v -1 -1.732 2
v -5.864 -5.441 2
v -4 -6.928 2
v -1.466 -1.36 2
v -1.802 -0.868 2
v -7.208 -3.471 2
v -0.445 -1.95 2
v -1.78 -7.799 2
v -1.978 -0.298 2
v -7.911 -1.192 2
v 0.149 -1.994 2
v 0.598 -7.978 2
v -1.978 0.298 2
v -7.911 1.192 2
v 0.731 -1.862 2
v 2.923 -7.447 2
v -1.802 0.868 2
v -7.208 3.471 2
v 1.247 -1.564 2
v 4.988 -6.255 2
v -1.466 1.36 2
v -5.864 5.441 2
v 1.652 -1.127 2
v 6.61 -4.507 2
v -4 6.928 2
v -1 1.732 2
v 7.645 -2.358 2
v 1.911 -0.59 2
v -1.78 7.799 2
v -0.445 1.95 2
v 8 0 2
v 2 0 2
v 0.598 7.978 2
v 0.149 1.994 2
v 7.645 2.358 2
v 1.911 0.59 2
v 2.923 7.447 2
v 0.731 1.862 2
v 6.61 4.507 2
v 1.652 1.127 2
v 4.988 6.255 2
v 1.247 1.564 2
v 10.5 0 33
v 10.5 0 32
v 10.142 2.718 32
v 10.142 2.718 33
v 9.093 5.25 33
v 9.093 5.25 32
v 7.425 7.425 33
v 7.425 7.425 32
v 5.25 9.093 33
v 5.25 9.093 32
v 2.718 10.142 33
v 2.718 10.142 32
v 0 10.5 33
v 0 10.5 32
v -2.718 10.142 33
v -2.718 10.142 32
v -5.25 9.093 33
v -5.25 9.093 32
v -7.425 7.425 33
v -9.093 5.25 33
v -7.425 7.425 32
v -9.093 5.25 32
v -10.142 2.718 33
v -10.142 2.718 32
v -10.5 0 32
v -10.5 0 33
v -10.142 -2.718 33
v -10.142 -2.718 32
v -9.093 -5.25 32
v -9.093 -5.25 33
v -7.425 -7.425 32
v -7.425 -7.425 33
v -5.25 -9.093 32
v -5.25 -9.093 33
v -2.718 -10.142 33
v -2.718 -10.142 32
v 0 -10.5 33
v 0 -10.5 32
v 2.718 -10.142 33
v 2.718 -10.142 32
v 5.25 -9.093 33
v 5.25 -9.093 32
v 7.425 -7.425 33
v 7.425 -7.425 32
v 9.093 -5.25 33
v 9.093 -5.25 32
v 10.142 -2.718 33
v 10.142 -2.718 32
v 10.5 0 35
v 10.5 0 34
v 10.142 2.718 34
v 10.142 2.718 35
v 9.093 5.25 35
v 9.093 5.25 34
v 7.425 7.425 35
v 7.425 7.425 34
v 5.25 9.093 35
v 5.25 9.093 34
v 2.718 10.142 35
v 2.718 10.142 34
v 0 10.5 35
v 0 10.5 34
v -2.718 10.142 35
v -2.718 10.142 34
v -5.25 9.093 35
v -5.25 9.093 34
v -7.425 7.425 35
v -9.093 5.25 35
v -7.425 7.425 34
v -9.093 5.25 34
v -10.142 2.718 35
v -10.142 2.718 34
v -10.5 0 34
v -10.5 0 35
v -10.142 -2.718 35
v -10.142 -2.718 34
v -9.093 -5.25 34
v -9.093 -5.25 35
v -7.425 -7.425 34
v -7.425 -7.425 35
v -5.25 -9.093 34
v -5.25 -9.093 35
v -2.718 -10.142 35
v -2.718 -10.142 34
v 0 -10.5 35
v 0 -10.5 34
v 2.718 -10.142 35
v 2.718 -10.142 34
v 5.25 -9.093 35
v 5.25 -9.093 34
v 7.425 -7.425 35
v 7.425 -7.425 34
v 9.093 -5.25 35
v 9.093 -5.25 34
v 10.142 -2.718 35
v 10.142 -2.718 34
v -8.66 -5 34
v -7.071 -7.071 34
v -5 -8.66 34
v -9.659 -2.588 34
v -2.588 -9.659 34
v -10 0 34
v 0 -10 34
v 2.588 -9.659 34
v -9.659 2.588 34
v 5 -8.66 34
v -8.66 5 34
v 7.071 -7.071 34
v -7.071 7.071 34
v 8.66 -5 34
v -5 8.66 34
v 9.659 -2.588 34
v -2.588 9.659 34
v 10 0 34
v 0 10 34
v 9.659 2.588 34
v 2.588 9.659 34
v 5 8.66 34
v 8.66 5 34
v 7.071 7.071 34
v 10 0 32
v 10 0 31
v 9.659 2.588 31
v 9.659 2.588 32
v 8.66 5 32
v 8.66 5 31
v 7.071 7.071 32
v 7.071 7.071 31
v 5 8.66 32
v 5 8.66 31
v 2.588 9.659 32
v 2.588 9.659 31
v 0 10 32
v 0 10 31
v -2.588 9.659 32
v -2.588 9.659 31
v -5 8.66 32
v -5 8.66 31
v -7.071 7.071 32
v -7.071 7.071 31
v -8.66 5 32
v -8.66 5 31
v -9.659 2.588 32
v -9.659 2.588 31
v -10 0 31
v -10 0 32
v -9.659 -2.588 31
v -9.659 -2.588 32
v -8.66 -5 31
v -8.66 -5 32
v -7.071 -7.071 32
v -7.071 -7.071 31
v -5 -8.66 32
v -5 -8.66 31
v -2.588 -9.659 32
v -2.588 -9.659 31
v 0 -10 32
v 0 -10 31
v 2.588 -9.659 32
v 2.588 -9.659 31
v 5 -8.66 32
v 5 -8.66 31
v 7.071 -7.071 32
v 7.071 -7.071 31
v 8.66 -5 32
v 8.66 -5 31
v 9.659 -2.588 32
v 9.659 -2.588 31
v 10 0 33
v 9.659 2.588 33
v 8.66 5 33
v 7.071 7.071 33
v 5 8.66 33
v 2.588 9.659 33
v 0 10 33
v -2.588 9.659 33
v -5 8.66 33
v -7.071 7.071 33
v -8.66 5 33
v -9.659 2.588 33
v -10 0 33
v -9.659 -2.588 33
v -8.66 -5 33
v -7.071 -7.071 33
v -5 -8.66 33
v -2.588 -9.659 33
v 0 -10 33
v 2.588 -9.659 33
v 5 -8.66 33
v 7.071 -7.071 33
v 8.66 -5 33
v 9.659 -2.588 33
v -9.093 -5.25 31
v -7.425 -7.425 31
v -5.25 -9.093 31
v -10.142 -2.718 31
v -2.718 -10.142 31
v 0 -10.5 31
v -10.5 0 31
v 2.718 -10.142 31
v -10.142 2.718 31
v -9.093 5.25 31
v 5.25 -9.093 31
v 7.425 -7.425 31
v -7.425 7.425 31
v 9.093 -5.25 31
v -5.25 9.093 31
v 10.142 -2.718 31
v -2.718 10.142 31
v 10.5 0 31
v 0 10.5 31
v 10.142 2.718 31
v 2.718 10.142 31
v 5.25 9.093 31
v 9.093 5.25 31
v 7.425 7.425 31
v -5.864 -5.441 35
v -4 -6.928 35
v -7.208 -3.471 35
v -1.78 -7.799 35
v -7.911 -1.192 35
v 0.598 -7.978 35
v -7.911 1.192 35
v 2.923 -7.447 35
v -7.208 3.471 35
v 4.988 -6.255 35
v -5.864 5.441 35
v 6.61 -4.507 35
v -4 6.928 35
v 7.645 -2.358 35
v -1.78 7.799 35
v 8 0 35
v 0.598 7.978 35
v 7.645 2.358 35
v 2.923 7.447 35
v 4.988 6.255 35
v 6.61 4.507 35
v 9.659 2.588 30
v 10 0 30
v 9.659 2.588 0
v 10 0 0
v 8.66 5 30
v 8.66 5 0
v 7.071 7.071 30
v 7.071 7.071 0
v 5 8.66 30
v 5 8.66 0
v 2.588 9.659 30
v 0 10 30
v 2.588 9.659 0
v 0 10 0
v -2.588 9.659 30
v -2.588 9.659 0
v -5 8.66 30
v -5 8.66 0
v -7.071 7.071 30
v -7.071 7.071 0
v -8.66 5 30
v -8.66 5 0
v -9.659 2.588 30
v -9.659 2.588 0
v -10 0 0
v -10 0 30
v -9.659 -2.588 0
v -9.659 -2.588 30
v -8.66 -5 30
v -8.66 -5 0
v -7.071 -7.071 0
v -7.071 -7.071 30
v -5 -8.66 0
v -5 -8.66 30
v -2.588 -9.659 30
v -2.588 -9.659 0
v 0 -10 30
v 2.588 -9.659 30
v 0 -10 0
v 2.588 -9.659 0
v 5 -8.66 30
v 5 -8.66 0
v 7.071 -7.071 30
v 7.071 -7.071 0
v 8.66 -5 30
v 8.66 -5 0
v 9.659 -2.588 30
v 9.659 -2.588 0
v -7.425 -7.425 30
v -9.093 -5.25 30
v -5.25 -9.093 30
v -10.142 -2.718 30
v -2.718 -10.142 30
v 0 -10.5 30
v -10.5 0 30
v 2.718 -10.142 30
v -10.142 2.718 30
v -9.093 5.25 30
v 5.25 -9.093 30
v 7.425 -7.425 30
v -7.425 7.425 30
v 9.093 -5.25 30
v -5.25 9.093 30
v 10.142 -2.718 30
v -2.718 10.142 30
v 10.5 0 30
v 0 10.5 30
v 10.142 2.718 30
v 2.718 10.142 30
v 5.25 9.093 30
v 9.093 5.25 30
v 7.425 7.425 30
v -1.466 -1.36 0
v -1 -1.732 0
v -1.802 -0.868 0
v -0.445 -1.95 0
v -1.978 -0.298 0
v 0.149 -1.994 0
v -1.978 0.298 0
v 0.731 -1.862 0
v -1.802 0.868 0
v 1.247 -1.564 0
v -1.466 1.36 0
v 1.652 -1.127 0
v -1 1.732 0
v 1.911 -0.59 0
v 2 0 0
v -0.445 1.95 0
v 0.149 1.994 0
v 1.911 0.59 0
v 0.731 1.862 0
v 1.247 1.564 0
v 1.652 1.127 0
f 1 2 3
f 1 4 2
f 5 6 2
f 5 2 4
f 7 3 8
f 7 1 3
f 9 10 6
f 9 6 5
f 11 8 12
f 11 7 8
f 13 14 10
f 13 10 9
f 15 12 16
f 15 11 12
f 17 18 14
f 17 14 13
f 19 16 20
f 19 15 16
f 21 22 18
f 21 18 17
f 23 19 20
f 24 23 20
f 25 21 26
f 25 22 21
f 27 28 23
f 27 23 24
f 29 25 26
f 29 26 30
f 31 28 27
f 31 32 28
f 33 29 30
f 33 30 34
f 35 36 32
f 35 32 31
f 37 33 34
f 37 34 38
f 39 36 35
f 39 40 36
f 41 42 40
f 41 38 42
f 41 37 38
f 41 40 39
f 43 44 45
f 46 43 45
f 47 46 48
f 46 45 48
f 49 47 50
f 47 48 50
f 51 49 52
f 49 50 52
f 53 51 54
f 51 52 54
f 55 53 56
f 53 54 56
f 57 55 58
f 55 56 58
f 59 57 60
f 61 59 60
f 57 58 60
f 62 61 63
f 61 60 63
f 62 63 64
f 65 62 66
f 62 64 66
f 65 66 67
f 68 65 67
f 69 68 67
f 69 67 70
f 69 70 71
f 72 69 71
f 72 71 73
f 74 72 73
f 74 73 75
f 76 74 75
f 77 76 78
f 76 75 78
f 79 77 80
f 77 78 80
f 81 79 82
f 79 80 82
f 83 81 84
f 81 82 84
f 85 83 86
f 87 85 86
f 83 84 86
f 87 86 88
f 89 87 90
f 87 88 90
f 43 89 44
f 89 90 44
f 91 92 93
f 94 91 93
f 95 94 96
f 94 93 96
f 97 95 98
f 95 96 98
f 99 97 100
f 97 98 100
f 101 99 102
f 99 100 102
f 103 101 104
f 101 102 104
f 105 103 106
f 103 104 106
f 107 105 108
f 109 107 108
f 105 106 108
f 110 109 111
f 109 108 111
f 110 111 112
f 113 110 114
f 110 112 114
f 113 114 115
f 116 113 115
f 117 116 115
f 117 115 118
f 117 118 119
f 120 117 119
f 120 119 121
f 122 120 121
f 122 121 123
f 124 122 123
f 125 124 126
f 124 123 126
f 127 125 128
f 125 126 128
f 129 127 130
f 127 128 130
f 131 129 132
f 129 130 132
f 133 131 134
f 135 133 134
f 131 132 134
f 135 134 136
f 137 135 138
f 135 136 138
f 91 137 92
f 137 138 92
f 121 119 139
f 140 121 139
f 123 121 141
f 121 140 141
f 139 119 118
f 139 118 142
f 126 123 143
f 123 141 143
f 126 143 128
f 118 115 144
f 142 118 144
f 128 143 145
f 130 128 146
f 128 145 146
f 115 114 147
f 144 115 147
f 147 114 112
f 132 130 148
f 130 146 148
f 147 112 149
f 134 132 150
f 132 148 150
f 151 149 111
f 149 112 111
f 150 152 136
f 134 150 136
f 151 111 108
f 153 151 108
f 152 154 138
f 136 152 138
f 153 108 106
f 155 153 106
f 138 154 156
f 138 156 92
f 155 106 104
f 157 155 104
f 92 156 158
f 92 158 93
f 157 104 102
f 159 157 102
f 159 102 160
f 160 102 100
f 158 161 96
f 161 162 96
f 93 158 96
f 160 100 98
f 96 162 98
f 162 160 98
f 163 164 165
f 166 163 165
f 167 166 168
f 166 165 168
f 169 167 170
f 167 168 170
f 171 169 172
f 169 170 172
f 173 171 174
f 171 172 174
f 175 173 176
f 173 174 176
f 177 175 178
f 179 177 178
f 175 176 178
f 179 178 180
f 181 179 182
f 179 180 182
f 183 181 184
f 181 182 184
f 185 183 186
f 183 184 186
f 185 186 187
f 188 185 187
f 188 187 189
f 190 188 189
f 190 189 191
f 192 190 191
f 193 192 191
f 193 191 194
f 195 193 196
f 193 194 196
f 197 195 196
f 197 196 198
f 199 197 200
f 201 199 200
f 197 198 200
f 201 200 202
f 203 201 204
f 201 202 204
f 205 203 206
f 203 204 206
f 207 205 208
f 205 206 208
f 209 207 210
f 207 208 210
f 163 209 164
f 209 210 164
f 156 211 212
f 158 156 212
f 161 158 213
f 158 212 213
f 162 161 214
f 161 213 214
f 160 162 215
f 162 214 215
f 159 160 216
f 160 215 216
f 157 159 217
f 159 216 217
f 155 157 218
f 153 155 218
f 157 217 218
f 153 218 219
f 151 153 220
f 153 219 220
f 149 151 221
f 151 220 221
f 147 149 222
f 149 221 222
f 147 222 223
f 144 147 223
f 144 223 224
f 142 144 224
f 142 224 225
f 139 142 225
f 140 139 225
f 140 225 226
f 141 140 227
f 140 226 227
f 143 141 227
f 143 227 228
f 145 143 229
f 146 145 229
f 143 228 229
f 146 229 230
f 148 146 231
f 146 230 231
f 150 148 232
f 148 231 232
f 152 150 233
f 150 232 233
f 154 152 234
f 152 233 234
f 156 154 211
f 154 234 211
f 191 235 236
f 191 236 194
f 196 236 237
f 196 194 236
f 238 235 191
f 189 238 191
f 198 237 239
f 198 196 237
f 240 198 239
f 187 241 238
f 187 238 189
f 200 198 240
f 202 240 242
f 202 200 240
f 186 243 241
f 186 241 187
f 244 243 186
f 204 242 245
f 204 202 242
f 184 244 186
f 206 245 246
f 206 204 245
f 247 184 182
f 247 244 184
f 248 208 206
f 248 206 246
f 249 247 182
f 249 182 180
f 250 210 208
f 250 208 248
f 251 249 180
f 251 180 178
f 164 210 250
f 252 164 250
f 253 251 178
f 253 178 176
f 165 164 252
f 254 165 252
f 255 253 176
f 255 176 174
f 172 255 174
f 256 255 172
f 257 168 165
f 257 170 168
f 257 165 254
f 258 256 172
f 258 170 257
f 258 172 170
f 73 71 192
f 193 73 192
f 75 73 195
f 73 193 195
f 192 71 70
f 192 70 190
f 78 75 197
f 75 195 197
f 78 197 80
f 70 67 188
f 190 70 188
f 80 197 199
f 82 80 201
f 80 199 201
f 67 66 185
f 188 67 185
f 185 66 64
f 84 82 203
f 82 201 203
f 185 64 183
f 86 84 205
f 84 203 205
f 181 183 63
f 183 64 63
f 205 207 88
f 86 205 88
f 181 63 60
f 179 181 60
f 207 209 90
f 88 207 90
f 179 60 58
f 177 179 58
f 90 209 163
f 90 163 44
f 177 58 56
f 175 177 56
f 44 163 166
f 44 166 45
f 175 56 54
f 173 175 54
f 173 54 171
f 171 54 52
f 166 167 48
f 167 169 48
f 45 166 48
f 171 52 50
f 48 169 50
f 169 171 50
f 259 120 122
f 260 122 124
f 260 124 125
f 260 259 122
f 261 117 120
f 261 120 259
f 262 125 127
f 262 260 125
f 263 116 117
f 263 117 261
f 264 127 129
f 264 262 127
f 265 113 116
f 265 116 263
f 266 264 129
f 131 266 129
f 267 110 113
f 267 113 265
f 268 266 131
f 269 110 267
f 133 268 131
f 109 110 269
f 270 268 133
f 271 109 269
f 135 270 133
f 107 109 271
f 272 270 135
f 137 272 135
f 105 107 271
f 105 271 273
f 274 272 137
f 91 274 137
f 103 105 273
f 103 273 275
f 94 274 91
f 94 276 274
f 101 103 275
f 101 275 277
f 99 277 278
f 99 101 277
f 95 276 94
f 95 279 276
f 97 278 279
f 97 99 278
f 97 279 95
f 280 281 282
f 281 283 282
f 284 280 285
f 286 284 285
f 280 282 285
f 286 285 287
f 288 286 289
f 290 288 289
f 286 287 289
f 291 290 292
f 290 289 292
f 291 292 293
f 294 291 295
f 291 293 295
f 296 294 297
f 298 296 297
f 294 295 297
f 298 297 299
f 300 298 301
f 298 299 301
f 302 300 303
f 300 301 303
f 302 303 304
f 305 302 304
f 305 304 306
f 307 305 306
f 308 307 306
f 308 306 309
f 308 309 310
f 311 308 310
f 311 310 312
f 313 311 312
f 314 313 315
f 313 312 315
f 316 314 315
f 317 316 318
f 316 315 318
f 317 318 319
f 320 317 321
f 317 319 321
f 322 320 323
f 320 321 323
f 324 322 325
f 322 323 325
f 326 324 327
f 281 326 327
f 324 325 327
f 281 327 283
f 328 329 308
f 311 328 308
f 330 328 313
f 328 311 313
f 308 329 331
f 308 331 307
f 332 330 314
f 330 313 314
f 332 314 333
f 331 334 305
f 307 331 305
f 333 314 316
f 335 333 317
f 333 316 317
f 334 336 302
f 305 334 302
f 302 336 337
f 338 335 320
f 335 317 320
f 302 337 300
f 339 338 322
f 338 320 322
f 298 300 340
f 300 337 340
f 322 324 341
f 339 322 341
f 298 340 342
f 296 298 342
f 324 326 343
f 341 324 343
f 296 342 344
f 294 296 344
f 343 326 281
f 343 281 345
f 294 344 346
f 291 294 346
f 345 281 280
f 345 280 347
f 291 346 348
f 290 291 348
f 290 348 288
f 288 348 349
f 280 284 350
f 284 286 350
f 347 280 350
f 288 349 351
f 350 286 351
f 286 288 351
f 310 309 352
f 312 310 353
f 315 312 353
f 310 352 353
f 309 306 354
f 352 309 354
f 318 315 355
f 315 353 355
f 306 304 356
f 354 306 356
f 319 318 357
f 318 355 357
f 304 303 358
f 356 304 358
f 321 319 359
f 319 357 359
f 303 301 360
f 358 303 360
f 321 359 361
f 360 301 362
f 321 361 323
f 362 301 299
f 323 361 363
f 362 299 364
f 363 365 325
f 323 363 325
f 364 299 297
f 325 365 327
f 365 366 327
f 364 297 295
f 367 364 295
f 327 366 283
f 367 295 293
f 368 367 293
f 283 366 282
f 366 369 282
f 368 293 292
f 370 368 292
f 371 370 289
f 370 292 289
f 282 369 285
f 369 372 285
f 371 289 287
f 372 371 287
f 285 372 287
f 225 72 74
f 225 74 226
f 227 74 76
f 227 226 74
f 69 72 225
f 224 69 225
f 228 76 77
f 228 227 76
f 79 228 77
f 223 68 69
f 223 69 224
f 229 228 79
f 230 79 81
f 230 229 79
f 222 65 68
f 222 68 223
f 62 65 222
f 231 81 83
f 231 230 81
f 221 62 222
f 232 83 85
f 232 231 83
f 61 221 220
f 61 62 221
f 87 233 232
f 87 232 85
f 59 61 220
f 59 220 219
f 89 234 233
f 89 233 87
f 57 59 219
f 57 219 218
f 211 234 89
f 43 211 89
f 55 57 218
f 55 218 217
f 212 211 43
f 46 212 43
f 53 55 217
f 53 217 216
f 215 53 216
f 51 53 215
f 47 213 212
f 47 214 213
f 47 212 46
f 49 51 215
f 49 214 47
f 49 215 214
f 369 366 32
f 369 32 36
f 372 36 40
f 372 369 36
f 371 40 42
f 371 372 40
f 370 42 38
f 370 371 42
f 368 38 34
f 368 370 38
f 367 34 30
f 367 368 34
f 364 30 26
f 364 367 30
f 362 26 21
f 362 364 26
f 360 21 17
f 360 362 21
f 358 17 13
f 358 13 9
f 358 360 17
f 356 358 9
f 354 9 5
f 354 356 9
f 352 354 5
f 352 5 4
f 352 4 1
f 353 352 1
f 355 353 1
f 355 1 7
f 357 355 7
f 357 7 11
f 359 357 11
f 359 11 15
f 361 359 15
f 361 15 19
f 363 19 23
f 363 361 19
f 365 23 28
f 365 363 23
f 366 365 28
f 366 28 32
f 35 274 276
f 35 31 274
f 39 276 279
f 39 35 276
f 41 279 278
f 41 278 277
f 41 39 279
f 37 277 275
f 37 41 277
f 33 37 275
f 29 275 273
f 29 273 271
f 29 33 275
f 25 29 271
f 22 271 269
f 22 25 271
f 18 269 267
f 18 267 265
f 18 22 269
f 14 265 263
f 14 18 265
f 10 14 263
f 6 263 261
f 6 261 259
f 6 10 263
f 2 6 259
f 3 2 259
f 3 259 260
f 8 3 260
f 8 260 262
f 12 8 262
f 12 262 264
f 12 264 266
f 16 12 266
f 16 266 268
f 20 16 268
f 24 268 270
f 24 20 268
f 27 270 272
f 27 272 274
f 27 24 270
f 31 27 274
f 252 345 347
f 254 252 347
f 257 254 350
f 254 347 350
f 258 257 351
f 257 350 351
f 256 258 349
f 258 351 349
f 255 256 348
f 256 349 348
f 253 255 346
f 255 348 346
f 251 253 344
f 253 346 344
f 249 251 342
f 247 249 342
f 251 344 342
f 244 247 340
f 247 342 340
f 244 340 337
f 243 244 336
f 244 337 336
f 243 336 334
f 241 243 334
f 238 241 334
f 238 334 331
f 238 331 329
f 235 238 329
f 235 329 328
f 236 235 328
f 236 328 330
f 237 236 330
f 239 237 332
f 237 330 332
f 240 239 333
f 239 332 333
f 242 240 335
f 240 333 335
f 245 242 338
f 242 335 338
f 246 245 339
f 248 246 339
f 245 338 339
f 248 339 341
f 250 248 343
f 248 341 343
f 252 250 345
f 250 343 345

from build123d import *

# Parameters (mm, degrees)
F0_R      = 10
F0_R_2    = 2
F1_DEPTH  = 2
F2_R      = 10
F2_R_2    = 8
F3_DEPTH  = 28
F4_R      = 10.5
F4_R_2    = 8
F5_DEPTH  = 1
F6_R      = 10
F6_R_2    = 8
F7_DEPTH  = 1
F8_R      = 10.5
F8_R_2    = 8
F9_DEPTH  = 1
F10_R     = 10
F10_R_2   = 8
F11_DEPTH = 1
F12_R     = 10.5
F12_R_2   = 8
F13_DEPTH = 1


with BuildPart() as f1:
    # F0 (on Top) → F1 (new body)
    with BuildSketch(Plane.XY):
        Circle(F0_R)
        Circle(F0_R_2, mode=Mode.SUBTRACT)
    extrude(amount=F1_DEPTH)

    # F2 (on face) → F3 (join)
    with BuildSketch(Plane.XY.offset(2)):
        Circle(F2_R)
        Circle(F2_R_2, mode=Mode.SUBTRACT)
    extrude(amount=F3_DEPTH)

    # F4 (on face) → F5 (join)
    with BuildSketch(Plane.XY.offset(30)):
        Circle(F4_R)
        Circle(F4_R_2, mode=Mode.SUBTRACT)
    extrude(amount=F5_DEPTH)

    # F6 (on face) → F7 (join)
    with BuildSketch(Plane.XY.offset(31)):
        Circle(F6_R)
        Circle(F6_R_2, mode=Mode.SUBTRACT)
    extrude(amount=F7_DEPTH)

    # F8 (on face) → F9 (join)
    with BuildSketch(Plane.XY.offset(32)):
        Circle(F8_R)
        Circle(F8_R_2, mode=Mode.SUBTRACT)
    extrude(amount=F9_DEPTH)

    # F10 (on face) → F11 (join)
    with BuildSketch(Plane.XY.offset(33)):
        Circle(F10_R)
        Circle(F10_R_2, mode=Mode.SUBTRACT)
    extrude(amount=F11_DEPTH)

    # F12 (on face) → F13 (join)
    with BuildSketch(Plane.XY.offset(34)):
        Circle(F12_R)
        Circle(F12_R_2, mode=Mode.SUBTRACT)
    extrude(amount=F13_DEPTH)


solid = f1.part
